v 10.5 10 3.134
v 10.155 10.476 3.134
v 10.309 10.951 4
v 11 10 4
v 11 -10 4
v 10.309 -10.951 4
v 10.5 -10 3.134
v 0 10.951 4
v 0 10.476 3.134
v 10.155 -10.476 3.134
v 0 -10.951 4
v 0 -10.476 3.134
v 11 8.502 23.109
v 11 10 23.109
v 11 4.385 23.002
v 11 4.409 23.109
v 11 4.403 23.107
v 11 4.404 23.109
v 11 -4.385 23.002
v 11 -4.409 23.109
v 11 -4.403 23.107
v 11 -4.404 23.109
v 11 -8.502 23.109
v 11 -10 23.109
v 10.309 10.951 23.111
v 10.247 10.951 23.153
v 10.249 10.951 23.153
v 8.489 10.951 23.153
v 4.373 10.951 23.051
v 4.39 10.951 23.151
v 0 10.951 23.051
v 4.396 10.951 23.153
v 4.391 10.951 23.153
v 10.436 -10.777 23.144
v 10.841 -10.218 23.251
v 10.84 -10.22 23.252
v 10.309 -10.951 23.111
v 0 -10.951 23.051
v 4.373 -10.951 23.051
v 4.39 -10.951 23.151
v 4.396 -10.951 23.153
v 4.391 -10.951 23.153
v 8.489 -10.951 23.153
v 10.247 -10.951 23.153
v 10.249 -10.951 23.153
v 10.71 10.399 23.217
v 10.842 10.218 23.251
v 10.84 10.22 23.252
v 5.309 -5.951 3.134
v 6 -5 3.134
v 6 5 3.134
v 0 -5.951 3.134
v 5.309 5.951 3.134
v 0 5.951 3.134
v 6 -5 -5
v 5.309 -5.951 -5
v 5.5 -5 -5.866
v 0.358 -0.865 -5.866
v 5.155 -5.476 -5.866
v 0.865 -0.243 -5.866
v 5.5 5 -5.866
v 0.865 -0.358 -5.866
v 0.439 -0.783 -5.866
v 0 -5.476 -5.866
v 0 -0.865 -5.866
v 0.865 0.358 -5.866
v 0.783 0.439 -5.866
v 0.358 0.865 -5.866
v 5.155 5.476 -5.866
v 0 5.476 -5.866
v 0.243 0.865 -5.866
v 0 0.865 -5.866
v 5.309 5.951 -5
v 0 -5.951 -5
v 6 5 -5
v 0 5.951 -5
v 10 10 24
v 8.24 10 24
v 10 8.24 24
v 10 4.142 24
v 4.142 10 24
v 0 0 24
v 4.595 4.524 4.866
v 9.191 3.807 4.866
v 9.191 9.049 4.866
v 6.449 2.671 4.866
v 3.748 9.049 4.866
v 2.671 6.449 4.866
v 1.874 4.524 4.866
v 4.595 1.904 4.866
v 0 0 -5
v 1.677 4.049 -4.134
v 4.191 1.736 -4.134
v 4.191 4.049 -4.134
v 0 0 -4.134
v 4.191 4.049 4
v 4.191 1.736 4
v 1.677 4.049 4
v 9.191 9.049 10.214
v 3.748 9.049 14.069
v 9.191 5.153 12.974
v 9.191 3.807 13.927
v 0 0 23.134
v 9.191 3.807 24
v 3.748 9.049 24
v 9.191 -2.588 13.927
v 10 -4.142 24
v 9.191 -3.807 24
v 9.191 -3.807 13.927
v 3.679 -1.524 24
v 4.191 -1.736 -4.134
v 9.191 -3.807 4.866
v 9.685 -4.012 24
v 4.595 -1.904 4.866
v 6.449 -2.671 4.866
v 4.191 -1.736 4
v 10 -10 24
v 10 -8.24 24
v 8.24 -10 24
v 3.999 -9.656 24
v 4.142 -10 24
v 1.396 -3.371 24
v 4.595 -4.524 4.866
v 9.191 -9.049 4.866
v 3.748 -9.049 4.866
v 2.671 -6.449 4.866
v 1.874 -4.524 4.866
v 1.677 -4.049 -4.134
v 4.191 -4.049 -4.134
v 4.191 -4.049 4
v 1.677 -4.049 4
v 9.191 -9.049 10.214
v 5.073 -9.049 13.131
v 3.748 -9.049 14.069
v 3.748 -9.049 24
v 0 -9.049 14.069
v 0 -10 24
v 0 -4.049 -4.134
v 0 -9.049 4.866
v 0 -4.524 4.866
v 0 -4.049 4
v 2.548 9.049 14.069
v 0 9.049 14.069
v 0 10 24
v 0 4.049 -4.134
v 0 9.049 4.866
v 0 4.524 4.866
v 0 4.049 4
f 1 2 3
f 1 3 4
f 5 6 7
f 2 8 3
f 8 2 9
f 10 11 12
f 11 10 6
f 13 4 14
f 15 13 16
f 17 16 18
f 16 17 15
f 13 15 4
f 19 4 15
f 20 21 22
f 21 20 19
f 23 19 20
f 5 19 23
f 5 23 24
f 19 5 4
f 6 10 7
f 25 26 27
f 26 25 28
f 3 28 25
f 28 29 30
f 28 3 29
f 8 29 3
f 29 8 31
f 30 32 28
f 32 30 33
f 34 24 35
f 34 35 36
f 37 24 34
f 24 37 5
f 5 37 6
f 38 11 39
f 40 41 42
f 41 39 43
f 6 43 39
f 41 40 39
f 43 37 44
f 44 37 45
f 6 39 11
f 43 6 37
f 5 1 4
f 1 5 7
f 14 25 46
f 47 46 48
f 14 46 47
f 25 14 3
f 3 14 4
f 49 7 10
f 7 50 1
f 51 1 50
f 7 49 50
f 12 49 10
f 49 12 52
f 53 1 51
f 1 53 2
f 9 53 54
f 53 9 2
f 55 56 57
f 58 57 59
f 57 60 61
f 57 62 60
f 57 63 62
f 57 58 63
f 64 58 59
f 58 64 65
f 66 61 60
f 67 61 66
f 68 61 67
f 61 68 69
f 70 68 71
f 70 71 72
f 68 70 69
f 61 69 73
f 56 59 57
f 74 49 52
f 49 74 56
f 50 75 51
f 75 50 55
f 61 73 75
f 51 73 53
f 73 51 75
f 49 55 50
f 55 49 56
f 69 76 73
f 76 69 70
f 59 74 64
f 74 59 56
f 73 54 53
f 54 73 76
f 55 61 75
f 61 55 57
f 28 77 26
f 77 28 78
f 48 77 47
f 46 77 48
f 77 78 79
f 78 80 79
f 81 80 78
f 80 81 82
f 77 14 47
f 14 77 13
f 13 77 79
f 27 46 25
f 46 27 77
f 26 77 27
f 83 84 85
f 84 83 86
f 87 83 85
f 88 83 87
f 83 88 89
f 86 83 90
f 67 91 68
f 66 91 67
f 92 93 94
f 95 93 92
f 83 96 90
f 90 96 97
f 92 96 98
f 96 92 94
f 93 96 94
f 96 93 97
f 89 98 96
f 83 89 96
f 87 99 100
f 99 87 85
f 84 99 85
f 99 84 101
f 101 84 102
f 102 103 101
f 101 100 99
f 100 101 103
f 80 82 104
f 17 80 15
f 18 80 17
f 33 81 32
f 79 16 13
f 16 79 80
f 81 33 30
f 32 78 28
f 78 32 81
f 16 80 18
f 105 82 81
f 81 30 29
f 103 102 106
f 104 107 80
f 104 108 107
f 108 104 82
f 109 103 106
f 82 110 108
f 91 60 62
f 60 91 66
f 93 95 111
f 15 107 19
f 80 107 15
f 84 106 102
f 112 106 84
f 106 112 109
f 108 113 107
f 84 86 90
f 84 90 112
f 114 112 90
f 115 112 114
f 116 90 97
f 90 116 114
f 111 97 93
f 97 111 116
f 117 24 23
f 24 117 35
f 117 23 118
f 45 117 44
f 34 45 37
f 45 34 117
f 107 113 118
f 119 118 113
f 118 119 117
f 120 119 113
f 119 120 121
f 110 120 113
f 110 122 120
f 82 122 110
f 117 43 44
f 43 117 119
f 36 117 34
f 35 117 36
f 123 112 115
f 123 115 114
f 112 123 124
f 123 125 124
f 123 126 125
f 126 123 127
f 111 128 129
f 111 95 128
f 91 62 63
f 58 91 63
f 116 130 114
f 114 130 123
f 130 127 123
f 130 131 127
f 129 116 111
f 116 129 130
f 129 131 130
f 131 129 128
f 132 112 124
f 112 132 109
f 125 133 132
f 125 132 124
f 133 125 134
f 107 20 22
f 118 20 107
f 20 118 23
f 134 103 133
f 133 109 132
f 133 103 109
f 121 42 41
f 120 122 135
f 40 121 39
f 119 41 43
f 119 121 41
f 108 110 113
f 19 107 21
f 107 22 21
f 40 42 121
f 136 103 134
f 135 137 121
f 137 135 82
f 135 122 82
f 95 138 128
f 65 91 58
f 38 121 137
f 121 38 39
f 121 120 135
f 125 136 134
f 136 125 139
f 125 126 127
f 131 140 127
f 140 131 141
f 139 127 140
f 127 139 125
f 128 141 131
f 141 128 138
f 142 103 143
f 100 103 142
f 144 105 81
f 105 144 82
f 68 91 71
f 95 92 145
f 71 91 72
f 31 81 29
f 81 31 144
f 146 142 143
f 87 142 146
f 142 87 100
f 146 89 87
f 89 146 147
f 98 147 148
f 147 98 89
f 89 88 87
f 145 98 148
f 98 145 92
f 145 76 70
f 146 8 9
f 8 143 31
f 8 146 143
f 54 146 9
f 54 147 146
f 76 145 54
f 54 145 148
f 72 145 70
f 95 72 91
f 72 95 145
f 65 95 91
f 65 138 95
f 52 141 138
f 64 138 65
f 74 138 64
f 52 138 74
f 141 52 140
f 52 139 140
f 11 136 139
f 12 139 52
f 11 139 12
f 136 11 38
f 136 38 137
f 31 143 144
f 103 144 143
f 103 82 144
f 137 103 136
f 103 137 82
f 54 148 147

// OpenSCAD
module wedge(theta=10,l=1000, center=false){
    if(center){
        translate([0,0,-l/2]) rotate([0,0,theta/2]) intersection(){
            cube(l*2);
            rotate(90-theta)cube(l);
        }
    } else{
        intersection(){
            cube(l*2);
            rotate(90-theta)cube(l);
        }
    }
}

module spike(theta=10,l=1000){
    intersection(){
        wedge(theta, l, center=true);
        rotate([0,90,0]) wedge(.1, l, center=true);
    }
}

module slice(theta){
    minkowski(){
            intersection(){
            wedge(theta=theta, center=true);
            children();
        }
        rotate([-45,0,0]) spike(theta=theta);
    }
}


module outer_shell(thickness=1){
    difference(){
        minkowski(){
            children();
            sphere(r=thickness);
        }
        children();
    }
}

module inner_shell(thickness = 1){
    intersection(){
        children();
        minkowski(){
            sphere(r=thickness);
            difference(){
                cube(1000, center=true);
                children();
            }
        }
    }
}

module supported_hollow(thickness=3,step=45, preview=true){
    intersection(){
        minkowski(){
            children();
            sphere(r=thickness);
        }
        for(i=[step:step:360]){
            rotate(-i) slice(step) rotate(i) inner_shell(thickness) children();
        }
        if(preview){
            l = 1000;
            translate([l/2,0,0]) cube(l, center=true);
        }
    }
}



module thingy(){
    union(){
        translate([0,0,14]) cube(20, center=true);
        cube(10, center=true);
    }
}

supported_hollow(step=45, thickness=1) thingy();
